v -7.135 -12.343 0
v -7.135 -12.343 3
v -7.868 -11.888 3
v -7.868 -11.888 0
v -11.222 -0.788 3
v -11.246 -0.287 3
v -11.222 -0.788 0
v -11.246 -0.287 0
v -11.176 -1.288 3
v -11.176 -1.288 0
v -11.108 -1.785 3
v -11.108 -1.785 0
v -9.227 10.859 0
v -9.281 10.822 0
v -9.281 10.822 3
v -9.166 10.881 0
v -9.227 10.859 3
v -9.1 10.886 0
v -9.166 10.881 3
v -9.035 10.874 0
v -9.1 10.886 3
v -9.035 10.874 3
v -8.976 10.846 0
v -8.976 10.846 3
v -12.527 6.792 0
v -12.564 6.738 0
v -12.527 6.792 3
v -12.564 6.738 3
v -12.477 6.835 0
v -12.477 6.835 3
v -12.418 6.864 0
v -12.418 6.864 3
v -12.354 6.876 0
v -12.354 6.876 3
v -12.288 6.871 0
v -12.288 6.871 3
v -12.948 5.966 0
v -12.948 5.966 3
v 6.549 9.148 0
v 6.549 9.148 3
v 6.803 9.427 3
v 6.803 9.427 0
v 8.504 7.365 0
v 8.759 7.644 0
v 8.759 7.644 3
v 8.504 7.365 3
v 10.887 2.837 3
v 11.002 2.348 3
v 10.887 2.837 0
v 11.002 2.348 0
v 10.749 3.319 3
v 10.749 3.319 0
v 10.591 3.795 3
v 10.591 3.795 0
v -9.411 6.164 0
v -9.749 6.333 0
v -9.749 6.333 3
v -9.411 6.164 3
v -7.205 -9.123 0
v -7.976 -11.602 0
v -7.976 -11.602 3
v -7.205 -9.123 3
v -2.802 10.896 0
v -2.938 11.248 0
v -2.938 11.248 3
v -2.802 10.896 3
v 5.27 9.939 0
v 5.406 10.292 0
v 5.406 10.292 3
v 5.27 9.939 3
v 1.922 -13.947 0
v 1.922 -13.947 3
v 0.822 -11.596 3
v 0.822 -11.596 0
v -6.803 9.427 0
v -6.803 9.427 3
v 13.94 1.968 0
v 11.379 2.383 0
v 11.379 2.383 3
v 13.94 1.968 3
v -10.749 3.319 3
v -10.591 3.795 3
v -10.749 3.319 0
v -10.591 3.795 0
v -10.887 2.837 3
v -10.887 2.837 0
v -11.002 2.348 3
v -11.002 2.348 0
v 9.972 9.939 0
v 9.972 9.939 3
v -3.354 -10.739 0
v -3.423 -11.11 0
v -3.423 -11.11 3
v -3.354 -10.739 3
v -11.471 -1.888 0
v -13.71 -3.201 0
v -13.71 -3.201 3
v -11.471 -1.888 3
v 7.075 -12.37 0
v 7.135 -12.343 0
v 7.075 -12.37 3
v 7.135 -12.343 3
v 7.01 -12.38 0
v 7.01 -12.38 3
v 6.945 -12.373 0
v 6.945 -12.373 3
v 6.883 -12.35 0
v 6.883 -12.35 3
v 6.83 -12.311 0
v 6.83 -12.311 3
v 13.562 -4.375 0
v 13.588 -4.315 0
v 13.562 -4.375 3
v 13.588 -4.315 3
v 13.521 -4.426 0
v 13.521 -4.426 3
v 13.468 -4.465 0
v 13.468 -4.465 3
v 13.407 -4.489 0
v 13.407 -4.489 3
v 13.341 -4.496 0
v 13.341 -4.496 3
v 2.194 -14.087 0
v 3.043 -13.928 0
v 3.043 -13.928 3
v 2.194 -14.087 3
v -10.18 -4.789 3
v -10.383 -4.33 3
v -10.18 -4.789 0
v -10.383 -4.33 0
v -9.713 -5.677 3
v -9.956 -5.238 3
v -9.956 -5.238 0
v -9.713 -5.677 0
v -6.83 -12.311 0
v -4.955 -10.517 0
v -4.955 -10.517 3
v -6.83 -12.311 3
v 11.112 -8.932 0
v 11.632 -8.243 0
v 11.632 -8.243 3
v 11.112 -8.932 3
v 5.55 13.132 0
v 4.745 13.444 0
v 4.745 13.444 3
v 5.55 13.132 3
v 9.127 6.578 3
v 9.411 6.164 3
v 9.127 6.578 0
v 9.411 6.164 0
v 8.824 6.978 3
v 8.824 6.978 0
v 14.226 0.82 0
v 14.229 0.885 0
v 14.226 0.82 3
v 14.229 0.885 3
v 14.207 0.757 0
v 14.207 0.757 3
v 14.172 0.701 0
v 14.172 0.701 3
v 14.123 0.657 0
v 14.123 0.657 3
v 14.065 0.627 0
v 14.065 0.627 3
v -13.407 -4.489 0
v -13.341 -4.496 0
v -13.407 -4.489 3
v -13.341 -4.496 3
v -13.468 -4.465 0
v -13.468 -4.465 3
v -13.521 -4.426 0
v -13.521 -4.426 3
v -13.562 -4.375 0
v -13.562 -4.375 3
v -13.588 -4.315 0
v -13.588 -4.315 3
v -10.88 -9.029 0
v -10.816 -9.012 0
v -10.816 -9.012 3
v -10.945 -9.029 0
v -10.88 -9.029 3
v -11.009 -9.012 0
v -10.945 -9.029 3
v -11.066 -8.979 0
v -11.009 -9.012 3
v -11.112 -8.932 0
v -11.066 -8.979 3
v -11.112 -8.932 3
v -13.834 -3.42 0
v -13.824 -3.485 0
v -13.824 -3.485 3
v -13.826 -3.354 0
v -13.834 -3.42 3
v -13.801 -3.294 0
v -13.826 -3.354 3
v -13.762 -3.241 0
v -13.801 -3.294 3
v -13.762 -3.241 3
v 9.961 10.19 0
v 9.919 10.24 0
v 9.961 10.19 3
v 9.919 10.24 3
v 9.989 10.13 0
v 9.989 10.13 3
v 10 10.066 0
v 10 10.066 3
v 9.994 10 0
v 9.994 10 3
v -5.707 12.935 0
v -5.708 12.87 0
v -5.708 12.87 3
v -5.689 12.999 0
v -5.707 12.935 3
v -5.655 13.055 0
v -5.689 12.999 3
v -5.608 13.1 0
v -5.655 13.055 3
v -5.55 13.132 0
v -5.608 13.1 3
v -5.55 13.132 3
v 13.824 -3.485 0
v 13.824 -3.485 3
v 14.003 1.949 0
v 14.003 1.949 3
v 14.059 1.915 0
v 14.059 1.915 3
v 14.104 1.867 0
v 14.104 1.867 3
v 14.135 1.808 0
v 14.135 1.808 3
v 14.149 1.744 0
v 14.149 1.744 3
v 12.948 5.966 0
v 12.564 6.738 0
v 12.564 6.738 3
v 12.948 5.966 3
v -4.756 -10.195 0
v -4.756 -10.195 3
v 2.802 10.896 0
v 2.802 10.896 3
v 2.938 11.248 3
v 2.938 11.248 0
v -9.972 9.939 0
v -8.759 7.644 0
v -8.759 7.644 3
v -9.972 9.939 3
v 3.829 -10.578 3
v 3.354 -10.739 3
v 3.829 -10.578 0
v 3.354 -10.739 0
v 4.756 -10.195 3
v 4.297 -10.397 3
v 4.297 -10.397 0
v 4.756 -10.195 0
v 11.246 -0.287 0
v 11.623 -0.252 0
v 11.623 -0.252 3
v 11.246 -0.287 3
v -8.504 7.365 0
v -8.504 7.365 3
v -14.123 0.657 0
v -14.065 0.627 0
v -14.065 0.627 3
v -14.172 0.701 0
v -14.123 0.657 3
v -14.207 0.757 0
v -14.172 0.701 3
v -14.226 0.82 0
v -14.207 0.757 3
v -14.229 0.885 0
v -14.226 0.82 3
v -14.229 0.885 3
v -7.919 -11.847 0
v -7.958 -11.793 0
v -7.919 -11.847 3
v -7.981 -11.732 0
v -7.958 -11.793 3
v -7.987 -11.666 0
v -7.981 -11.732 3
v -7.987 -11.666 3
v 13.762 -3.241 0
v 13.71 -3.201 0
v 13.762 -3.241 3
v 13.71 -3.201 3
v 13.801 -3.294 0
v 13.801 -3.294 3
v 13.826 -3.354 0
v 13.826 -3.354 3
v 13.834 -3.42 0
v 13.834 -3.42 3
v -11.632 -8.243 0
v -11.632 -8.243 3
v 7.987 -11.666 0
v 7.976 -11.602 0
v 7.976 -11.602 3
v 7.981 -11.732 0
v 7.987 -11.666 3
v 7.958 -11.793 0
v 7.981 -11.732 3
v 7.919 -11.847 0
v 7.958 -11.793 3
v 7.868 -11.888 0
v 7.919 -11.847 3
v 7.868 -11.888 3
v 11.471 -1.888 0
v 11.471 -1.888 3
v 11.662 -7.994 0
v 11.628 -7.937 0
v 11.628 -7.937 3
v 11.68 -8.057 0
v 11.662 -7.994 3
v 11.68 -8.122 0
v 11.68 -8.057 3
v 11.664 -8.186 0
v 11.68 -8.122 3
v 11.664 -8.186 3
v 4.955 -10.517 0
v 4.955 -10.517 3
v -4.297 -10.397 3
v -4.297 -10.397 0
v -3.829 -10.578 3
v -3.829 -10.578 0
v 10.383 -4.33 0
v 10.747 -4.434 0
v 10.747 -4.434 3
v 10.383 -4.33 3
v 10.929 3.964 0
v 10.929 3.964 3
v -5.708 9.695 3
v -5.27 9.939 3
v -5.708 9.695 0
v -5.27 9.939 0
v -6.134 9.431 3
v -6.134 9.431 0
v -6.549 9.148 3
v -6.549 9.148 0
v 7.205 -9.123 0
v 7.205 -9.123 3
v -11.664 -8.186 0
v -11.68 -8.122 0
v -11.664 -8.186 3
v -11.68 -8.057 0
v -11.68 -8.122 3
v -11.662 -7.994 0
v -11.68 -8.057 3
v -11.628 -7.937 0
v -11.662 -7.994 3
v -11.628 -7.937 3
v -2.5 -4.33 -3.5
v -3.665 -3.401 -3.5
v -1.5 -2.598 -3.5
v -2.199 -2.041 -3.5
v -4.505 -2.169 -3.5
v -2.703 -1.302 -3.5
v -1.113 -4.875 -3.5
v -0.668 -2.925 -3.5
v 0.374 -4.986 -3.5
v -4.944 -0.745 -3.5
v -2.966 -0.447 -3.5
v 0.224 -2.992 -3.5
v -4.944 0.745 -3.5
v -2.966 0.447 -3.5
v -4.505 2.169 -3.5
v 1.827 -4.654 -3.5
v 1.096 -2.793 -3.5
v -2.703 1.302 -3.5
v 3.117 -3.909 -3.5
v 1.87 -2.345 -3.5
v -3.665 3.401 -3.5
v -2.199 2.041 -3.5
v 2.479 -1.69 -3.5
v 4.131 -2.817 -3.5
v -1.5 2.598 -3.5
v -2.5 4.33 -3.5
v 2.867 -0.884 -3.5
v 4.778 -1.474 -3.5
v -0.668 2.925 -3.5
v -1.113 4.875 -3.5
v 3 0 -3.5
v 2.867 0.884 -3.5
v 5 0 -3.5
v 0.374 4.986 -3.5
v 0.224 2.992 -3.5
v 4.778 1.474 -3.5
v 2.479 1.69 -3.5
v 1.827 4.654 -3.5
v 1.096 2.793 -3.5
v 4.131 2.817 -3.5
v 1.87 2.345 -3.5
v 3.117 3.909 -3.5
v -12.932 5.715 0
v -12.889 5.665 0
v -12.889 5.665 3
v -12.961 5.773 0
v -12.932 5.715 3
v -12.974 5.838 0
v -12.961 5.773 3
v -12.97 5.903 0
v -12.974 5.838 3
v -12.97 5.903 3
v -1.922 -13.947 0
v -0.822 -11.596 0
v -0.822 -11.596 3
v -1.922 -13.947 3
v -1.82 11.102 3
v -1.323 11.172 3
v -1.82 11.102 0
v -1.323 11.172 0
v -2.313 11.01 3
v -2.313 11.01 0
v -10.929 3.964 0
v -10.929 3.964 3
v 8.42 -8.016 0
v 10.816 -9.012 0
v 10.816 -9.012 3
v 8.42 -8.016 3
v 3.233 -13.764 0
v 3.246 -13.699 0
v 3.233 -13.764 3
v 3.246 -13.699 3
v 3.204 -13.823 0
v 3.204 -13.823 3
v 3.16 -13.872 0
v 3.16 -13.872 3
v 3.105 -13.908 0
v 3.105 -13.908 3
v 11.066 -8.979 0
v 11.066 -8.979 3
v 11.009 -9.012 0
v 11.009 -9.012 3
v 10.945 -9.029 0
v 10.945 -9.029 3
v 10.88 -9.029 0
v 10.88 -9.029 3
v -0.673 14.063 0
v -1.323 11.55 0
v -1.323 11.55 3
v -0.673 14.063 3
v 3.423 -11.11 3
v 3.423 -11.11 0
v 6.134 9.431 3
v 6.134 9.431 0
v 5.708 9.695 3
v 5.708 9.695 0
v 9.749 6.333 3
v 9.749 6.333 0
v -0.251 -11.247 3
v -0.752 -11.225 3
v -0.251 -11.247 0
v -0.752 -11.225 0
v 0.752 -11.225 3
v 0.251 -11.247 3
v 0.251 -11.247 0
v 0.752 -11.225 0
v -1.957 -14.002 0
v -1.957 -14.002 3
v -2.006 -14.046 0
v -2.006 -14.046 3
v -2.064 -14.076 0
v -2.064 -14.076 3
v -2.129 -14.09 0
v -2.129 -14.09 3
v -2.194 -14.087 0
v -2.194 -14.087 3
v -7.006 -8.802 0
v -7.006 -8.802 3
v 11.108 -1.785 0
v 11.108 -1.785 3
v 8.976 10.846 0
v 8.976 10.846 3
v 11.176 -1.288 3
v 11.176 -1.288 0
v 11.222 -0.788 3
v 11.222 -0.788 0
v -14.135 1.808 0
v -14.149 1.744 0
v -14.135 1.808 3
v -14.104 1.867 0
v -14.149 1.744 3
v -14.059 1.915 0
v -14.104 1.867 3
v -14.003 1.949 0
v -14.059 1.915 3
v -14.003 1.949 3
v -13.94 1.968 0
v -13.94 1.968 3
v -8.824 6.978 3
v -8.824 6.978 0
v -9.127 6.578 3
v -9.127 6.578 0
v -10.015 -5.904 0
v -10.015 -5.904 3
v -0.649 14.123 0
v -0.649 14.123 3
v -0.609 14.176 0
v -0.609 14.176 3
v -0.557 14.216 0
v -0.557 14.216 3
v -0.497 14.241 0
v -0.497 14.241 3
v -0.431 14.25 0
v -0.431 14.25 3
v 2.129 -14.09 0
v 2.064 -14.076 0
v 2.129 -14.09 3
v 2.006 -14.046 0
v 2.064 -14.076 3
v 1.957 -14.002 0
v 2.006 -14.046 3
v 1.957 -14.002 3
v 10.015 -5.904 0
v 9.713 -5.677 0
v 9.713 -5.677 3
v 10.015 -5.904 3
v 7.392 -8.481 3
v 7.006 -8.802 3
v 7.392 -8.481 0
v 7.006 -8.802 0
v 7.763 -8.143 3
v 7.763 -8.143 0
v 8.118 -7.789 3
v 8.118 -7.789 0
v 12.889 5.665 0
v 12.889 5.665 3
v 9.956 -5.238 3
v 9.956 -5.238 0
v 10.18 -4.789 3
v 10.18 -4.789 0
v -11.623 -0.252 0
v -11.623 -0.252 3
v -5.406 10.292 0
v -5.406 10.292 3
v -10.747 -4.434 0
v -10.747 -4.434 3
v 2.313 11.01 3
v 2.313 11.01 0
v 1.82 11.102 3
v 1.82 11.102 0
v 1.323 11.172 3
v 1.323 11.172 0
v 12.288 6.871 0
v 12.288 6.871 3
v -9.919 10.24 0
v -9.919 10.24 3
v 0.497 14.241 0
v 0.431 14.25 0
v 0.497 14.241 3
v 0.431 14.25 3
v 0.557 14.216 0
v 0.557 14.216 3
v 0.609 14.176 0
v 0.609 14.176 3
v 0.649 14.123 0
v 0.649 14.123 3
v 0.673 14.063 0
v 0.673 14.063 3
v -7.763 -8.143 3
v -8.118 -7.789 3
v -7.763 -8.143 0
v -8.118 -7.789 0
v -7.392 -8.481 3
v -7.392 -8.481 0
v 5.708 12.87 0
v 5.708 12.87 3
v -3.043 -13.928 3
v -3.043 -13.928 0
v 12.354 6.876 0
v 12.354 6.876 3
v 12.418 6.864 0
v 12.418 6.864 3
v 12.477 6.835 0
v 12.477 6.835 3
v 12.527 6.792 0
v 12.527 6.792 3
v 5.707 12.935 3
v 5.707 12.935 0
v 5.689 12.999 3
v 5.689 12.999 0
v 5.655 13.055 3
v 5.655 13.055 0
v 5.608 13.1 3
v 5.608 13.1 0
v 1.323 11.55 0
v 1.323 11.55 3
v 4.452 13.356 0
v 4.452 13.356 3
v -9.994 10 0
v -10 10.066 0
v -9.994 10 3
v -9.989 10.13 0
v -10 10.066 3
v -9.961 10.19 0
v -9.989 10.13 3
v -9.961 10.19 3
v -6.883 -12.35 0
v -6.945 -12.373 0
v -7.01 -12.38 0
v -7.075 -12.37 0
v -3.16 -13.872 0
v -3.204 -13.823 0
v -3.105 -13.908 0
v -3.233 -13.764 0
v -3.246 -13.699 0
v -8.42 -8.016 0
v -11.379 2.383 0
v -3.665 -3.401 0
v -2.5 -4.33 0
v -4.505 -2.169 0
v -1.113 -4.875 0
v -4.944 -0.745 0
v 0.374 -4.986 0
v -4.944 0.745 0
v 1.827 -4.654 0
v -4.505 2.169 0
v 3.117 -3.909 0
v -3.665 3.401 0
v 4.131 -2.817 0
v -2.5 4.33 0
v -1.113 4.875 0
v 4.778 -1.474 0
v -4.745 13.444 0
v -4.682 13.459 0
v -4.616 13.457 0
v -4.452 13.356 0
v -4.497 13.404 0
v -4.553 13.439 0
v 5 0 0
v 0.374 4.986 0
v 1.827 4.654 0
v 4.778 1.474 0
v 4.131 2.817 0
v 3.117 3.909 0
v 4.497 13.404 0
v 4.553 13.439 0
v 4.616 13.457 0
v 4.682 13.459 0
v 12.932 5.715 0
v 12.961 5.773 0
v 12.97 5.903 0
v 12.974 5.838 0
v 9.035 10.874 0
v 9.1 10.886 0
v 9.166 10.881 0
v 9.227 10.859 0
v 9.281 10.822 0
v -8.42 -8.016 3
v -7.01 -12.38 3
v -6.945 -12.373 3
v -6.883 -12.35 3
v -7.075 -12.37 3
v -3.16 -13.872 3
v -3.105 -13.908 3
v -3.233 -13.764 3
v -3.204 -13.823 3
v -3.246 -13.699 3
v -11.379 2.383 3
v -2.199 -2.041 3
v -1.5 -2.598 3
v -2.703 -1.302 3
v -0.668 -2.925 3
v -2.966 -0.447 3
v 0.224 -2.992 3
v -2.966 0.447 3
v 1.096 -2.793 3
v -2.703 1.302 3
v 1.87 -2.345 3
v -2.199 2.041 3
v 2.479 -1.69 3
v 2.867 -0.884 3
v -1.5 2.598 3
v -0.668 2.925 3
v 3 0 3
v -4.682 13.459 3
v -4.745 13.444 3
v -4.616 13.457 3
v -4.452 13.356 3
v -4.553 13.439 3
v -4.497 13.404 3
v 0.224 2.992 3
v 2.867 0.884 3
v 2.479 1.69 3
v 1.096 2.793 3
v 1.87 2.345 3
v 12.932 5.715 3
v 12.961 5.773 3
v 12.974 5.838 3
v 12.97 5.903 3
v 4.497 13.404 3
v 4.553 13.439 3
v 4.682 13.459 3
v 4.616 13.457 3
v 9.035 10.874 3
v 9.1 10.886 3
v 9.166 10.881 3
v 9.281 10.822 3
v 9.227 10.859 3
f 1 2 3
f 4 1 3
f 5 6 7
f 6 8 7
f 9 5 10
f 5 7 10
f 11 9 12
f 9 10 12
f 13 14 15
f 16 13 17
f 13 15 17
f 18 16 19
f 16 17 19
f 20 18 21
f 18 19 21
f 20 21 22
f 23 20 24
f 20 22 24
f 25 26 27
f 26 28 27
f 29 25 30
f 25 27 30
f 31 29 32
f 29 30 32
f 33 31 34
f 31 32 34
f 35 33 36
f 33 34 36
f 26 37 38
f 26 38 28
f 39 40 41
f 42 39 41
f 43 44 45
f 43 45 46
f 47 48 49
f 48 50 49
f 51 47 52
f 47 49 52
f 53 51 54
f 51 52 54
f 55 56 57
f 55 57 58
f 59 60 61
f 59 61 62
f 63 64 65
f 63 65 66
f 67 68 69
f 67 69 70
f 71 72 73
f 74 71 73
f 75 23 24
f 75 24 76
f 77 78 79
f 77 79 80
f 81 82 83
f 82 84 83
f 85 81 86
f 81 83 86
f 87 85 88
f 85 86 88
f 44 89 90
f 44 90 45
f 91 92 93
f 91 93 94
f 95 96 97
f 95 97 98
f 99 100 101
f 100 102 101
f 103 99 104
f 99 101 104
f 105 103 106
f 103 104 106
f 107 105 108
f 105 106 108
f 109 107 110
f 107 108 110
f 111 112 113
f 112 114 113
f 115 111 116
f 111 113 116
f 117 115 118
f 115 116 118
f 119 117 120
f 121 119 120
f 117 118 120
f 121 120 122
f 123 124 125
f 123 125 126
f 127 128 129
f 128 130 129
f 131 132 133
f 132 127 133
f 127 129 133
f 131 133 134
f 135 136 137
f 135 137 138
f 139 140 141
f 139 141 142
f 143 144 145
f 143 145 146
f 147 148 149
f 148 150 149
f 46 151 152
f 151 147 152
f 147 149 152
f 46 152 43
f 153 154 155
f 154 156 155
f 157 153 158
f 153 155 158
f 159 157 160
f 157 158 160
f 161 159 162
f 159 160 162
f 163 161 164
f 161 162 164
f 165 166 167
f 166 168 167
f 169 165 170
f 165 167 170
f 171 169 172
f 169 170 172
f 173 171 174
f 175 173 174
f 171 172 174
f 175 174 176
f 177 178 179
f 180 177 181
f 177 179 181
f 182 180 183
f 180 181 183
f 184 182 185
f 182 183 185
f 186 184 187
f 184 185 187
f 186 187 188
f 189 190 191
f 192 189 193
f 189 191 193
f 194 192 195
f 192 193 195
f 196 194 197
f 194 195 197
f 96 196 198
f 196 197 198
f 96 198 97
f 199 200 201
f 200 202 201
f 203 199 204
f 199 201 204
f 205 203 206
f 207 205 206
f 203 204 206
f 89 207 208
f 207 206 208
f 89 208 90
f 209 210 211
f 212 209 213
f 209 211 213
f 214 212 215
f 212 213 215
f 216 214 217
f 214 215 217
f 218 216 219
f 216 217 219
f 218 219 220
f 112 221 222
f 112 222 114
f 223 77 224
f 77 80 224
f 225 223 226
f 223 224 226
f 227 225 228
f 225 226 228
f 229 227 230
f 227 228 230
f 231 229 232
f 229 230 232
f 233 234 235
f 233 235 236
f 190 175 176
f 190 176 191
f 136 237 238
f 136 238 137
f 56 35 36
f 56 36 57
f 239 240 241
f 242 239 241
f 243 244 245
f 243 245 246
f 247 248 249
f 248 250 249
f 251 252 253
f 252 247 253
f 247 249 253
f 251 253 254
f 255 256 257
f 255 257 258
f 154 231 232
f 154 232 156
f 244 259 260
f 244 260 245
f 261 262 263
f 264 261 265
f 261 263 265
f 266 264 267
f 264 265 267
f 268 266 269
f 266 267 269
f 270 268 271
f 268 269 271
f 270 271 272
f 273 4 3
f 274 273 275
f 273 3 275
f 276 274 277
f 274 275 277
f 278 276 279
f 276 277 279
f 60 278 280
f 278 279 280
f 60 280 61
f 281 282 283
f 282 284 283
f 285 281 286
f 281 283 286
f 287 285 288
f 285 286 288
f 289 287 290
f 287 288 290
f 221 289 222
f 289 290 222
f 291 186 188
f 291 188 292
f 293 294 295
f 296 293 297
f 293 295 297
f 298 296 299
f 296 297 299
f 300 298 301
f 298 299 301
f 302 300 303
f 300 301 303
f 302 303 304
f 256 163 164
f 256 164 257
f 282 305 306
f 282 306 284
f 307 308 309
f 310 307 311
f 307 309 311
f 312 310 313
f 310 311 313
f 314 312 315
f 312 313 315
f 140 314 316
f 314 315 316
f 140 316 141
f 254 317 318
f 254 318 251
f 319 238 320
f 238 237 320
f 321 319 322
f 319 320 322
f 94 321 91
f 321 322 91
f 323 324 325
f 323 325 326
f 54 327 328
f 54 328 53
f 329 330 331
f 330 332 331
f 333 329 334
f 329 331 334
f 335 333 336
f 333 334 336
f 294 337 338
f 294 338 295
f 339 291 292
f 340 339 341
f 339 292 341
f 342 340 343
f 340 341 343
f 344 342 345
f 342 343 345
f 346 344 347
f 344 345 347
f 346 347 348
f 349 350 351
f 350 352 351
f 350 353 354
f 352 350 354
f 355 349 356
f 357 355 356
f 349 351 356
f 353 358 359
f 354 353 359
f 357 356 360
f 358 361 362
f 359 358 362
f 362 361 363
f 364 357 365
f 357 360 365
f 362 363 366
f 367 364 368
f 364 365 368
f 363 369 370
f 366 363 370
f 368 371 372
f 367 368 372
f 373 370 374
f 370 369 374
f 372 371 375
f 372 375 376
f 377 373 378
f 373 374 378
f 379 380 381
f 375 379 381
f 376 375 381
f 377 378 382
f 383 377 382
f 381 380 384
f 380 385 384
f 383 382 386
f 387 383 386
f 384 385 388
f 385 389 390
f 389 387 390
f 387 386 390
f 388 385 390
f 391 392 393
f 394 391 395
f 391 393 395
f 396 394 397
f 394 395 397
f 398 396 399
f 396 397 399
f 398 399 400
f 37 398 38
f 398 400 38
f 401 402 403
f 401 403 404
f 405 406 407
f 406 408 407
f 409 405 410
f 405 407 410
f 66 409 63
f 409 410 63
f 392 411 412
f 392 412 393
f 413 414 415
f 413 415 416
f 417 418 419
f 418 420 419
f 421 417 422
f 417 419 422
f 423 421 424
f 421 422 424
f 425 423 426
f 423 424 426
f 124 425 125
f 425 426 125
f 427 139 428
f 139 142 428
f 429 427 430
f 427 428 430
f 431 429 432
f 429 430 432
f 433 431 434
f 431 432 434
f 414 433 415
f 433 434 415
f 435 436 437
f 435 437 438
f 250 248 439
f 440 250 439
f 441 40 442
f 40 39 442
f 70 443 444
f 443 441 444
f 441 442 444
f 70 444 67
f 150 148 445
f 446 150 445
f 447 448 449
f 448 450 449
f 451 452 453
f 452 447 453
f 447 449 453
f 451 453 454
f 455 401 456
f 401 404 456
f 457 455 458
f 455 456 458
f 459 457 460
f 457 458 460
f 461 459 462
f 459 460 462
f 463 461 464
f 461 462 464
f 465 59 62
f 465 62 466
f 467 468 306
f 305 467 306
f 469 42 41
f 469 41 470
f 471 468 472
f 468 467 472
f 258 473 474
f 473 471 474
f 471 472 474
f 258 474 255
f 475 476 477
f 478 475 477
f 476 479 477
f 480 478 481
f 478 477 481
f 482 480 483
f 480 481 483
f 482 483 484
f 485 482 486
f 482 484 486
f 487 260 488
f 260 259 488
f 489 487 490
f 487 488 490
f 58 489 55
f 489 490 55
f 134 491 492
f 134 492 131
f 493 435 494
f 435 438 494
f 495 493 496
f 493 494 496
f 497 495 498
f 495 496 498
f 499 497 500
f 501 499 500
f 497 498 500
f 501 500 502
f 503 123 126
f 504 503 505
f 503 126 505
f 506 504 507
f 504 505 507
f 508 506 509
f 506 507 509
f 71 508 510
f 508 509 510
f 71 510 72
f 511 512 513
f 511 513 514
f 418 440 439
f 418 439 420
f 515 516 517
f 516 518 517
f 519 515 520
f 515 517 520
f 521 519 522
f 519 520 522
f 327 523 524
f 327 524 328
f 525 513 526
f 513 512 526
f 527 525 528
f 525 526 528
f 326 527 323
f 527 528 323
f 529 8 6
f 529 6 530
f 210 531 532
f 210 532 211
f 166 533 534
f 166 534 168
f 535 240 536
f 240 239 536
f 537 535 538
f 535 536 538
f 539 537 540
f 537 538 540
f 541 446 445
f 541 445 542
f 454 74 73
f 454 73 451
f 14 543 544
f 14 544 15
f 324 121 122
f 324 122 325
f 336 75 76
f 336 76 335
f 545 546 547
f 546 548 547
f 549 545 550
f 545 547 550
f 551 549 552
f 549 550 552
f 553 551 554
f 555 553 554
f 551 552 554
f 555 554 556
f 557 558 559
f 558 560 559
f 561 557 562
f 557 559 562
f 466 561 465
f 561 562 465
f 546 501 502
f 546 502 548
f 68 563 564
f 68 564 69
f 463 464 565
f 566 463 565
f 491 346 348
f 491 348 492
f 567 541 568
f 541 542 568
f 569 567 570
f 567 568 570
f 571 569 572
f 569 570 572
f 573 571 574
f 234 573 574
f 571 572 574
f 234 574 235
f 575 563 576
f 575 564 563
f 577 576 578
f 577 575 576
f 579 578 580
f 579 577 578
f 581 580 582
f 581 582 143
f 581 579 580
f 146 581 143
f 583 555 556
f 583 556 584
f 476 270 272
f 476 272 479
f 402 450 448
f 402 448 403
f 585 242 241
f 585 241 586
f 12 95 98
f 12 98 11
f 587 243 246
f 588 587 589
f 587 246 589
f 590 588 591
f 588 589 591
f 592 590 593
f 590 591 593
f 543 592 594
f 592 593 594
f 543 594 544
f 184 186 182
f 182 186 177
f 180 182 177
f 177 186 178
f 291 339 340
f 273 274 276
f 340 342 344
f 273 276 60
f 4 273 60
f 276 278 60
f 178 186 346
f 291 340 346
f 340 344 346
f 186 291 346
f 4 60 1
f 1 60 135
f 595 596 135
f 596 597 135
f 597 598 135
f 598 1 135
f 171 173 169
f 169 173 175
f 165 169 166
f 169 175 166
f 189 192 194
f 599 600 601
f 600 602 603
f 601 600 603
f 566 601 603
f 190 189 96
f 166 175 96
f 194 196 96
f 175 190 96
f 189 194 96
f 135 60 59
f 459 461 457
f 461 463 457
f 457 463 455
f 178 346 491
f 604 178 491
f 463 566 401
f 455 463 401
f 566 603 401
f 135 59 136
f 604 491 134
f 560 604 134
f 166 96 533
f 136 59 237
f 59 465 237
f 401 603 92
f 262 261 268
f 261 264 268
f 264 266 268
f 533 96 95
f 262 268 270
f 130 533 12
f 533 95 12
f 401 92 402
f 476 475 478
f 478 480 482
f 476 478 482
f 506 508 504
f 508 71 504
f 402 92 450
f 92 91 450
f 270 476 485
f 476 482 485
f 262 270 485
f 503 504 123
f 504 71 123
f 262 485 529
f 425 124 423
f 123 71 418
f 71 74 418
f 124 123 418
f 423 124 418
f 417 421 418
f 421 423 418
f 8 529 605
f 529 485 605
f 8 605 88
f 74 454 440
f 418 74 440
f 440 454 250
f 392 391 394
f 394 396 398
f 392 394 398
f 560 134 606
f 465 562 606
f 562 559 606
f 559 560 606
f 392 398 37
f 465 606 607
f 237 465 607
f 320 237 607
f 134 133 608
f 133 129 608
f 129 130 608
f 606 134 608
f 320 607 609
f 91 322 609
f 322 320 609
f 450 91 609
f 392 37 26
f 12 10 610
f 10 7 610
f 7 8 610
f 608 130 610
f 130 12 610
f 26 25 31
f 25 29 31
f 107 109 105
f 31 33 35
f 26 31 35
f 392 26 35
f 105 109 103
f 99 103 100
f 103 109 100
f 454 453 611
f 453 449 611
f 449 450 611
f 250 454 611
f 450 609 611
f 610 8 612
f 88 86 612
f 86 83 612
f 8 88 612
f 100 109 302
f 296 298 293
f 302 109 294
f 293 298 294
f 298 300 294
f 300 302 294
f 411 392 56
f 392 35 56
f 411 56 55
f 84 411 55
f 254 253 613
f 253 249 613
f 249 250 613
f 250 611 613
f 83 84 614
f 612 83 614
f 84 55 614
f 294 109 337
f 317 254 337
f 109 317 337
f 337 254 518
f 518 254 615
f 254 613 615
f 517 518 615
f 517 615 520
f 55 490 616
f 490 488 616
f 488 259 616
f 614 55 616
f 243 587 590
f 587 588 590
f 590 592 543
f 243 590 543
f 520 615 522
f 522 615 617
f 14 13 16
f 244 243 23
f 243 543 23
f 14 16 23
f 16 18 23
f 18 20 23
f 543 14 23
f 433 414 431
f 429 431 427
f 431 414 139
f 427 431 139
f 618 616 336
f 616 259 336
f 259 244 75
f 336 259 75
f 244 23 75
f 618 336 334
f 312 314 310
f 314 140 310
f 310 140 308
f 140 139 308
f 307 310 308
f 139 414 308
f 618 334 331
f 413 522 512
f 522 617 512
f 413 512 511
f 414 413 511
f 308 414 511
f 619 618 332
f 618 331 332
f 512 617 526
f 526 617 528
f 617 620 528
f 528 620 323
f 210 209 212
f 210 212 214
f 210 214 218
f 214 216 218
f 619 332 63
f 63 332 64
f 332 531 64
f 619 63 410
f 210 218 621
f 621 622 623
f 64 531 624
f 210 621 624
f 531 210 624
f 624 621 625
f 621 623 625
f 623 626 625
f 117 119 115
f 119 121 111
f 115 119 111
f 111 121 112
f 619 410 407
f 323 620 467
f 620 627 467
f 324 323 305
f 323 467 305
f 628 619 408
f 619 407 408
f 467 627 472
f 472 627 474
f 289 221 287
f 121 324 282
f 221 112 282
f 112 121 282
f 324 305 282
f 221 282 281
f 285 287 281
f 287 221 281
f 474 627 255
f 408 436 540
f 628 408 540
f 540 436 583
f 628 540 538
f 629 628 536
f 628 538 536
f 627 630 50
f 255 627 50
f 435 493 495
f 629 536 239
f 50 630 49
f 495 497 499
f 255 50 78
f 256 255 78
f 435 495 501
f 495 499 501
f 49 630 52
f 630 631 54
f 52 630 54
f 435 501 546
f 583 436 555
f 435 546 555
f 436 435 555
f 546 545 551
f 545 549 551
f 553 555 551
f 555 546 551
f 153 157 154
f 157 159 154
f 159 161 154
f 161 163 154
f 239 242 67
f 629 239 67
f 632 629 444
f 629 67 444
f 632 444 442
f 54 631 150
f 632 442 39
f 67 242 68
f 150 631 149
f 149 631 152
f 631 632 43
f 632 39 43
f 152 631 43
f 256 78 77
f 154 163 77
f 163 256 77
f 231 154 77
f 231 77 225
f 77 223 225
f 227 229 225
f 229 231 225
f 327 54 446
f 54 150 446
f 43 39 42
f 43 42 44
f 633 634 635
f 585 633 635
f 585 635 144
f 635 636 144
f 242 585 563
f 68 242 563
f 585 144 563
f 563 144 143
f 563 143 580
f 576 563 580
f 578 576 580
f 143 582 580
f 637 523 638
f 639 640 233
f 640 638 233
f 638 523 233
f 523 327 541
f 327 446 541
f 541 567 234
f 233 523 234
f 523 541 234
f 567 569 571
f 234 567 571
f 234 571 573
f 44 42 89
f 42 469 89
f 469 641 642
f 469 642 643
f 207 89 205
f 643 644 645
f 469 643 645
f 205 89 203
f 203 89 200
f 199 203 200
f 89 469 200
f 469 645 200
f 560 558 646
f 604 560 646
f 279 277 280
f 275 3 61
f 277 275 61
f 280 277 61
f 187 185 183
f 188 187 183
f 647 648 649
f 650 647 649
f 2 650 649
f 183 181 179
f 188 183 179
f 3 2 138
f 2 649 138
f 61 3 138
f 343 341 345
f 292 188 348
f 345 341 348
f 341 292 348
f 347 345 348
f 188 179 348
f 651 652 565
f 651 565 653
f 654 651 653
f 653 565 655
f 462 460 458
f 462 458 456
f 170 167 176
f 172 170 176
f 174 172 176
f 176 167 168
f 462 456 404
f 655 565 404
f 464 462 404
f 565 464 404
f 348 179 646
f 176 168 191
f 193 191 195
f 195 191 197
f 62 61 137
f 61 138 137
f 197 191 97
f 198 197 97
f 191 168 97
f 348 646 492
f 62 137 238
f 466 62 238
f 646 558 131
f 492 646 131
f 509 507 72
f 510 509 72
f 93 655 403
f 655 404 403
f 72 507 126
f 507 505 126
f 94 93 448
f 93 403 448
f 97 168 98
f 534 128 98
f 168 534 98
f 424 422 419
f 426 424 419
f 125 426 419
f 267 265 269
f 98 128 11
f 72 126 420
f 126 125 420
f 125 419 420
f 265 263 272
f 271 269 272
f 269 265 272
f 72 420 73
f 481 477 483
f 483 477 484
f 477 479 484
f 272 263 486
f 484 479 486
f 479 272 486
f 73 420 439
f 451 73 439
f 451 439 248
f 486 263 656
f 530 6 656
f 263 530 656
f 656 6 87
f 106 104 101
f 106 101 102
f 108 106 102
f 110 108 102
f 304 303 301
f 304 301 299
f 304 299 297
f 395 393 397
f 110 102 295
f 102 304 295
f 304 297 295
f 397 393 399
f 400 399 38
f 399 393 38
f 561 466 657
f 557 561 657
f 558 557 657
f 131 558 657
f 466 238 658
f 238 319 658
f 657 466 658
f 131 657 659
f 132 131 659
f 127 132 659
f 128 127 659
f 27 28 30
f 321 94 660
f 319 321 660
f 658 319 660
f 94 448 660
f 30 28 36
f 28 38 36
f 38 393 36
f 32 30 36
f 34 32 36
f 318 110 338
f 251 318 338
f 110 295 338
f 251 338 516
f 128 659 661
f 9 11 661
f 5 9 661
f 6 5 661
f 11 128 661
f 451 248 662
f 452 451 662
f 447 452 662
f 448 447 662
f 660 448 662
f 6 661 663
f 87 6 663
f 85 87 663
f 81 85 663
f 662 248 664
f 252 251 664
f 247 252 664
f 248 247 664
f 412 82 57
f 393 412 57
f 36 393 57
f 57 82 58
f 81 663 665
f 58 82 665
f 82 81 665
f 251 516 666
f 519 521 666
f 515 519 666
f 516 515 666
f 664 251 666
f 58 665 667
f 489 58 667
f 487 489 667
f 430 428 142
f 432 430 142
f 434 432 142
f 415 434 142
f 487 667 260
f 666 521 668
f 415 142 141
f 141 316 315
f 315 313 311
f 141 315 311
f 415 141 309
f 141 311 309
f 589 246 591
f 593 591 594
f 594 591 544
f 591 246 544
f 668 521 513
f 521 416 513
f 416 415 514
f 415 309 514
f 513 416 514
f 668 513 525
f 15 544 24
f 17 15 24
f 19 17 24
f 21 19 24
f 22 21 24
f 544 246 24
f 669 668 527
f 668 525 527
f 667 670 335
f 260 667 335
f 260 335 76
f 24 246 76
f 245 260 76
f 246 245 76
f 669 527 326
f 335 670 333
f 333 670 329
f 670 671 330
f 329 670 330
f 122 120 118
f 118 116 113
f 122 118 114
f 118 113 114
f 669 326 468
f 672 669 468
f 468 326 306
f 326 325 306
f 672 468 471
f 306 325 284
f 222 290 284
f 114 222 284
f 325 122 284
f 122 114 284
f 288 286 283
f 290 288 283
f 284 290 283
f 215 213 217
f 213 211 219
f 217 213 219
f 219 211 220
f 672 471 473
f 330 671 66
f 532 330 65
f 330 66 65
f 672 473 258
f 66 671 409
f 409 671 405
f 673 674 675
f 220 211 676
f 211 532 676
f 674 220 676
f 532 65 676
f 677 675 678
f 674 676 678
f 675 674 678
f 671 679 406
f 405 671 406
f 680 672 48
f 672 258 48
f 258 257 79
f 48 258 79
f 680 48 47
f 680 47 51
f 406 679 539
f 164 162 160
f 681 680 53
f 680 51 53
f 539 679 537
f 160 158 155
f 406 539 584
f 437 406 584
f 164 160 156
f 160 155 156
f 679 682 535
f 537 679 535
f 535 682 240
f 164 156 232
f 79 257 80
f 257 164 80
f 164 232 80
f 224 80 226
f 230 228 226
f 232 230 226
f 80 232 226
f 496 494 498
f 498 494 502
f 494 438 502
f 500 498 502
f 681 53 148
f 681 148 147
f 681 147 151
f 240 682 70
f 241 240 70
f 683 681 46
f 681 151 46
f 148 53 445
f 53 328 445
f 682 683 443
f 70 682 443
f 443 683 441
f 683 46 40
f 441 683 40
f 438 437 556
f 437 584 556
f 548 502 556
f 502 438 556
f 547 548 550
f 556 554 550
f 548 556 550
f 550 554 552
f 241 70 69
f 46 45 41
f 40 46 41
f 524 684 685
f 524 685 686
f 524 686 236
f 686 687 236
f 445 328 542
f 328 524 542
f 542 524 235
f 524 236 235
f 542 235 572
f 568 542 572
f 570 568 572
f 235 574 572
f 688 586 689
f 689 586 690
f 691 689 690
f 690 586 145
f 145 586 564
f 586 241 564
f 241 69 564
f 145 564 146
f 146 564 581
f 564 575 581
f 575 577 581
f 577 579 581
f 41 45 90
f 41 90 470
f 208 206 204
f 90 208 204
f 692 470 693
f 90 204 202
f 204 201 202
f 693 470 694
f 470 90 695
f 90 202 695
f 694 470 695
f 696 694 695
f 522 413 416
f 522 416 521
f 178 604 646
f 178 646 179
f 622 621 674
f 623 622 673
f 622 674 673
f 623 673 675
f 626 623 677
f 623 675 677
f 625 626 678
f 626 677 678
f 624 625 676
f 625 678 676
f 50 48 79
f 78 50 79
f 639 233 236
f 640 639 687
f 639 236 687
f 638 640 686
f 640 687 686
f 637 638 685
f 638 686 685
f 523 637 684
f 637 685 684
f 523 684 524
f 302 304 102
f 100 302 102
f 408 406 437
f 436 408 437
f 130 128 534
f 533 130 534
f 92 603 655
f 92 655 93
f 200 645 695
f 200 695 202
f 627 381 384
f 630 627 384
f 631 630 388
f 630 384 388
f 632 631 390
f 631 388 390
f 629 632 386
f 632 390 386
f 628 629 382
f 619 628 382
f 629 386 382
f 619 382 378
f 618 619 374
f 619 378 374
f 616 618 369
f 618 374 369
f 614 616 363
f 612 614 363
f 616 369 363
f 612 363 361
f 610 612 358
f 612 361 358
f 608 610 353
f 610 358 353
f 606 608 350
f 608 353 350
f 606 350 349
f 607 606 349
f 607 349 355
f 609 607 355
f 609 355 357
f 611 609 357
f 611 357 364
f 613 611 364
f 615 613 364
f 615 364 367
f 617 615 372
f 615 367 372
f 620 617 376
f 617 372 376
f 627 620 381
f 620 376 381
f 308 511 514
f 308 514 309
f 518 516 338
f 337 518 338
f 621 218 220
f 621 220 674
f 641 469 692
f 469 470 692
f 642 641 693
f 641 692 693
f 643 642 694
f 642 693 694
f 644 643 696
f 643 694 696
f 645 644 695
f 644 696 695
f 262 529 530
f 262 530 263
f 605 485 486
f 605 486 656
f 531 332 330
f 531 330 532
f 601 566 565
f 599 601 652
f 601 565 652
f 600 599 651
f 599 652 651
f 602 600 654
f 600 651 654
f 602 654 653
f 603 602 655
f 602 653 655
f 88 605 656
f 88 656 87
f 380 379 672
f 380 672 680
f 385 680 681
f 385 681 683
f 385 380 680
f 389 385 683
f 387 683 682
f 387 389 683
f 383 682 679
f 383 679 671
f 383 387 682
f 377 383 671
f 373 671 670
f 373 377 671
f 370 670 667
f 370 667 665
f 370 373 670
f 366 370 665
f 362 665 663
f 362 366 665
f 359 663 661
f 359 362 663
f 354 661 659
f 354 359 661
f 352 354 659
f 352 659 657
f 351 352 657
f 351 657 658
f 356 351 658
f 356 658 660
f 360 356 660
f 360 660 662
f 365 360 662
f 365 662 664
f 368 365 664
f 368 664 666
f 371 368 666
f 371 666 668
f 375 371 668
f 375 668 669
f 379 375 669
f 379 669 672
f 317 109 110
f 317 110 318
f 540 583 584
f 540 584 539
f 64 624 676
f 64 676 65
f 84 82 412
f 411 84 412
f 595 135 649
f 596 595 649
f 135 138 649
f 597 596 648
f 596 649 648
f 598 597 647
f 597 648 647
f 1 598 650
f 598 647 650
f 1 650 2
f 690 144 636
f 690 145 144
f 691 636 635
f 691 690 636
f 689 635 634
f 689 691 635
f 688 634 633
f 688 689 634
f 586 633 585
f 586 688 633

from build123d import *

# Parameters (mm, degrees)
SKETCH1_R                = 11.25
SKETCH1_R_2              = 3
BOSS_EXTRUDE1_DEPTH      = 3
BOSS_EXTRUDE2_DEPTH      = 3
FILLET1_R                = 0.25
CIRPATTERN1_COUNT        = 17
FILLET1_OF_CIRPATTERN1_R = 0.25
BOSS_EXTRUDE3_START      = -3.5
SKETCH3_R                = 5
SKETCH3_R_2              = 3
BOSS_EXTRUDE3_DEPTH      = 3.5


with BuildPart() as part:
    # Sketch1 → Boss-Extrude1 (new body)
    with BuildSketch(Plane.XY):
        Circle(SKETCH1_R)
        Circle(SKETCH1_R_2, mode=Mode.SUBTRACT)
    extrude(amount=BOSS_EXTRUDE1_DEPTH)

    # Sketch2 → Boss-Extrude2 (add)
    with BuildSketch(Plane.XY):
        Polygon((-1.323267478, 10.75), (-1.323267478, 11.55), (-0.625, 14.25), (0.625, 14.25), (1.323267478, 11.55), (1.323267478, 10.75), align=None)
    boss_extrude2 = extrude(amount=BOSS_EXTRUDE2_DEPTH)

    # Fillet1
    fillet1_edges = [part.edges().sort_by_distance(p)[0] for p in [
        (0.625, 14.25, 1.5),
        (-0.625, 14.25, 1.5),
    ]]
    fillet(fillet1_edges, radius=FILLET1_R)

    # CirPattern1: Boss-Extrude2 ×17 about axis
    cirpattern1_axis = Axis((0, 0, 0), (0, 0, 1))
    for i in range(1, CIRPATTERN1_COUNT):
        add(boss_extrude2.rotate(cirpattern1_axis, i * 360 / CIRPATTERN1_COUNT))

    # Fillet1 of CirPattern1
    fillet1_of_cirpattern1_edges = [part.edges().sort_by_distance(p)[0] for p in [
        (-4.5648986, 13.51350531, 1.5),
        (-5.730488887, 13.061953228, 1.5),
        (-9.138282349, 10.951936848, 1.5),
        (-10.062043495, 10.109817293, 1.5),
        (-12.477490429, 6.911248627, 1.5),
        (-13.034663374, 5.792294513, 1.5),
        (-14.131544288, 1.937157983, 1.5),
        (-14.246879737, 0.692490262, 1.5),
        (-13.877054784, -3.298556582, 1.5),
        (-13.534976046, -4.500838636, 1.5),
        (-11.748392136, -8.088782801, 1.5),
        (-10.995098841, -9.086304335, 1.5),
        (-8.033044031, -11.786574082, 1.5),
        (-6.970272611, -12.444614286, 1.5),
        (-3.232788816, -13.892523222, 1.5),
        (-2.004072442, -14.122210119, 1.5),
        (2.004072442, -14.122210119, 1.5),
        (3.232788816, -13.892523222, 1.5),
        (6.970272611, -12.444614286, 1.5),
        (8.033044031, -11.786574082, 1.5),
        (10.995098841, -9.086304335, 1.5),
        (11.748392136, -8.088782801, 1.5),
        (13.534976046, -4.500838636, 1.5),
        (13.877054784, -3.298556582, 1.5),
        (14.246879737, 0.692490262, 1.5),
        (14.131544288, 1.937157983, 1.5),
        (13.034663374, 5.792294513, 1.5),
        (12.477490429, 6.911248627, 1.5),
        (10.062043495, 10.109817293, 1.5),
        (9.138282349, 10.951936848, 1.5),
        (5.730488887, 13.061953228, 1.5),
        (4.5648986, 13.51350531, 1.5),
    ]]
    fillet(fillet1_of_cirpattern1_edges, radius=FILLET1_OF_CIRPATTERN1_R)

    # Sketch3 → Boss-Extrude3 (add)
    with BuildSketch(Plane.XY.offset(BOSS_EXTRUDE3_START)):
        Circle(SKETCH3_R)
        Circle(SKETCH3_R_2, mode=Mode.SUBTRACT)
    extrude(amount=BOSS_EXTRUDE3_DEPTH)


solid = part.part
